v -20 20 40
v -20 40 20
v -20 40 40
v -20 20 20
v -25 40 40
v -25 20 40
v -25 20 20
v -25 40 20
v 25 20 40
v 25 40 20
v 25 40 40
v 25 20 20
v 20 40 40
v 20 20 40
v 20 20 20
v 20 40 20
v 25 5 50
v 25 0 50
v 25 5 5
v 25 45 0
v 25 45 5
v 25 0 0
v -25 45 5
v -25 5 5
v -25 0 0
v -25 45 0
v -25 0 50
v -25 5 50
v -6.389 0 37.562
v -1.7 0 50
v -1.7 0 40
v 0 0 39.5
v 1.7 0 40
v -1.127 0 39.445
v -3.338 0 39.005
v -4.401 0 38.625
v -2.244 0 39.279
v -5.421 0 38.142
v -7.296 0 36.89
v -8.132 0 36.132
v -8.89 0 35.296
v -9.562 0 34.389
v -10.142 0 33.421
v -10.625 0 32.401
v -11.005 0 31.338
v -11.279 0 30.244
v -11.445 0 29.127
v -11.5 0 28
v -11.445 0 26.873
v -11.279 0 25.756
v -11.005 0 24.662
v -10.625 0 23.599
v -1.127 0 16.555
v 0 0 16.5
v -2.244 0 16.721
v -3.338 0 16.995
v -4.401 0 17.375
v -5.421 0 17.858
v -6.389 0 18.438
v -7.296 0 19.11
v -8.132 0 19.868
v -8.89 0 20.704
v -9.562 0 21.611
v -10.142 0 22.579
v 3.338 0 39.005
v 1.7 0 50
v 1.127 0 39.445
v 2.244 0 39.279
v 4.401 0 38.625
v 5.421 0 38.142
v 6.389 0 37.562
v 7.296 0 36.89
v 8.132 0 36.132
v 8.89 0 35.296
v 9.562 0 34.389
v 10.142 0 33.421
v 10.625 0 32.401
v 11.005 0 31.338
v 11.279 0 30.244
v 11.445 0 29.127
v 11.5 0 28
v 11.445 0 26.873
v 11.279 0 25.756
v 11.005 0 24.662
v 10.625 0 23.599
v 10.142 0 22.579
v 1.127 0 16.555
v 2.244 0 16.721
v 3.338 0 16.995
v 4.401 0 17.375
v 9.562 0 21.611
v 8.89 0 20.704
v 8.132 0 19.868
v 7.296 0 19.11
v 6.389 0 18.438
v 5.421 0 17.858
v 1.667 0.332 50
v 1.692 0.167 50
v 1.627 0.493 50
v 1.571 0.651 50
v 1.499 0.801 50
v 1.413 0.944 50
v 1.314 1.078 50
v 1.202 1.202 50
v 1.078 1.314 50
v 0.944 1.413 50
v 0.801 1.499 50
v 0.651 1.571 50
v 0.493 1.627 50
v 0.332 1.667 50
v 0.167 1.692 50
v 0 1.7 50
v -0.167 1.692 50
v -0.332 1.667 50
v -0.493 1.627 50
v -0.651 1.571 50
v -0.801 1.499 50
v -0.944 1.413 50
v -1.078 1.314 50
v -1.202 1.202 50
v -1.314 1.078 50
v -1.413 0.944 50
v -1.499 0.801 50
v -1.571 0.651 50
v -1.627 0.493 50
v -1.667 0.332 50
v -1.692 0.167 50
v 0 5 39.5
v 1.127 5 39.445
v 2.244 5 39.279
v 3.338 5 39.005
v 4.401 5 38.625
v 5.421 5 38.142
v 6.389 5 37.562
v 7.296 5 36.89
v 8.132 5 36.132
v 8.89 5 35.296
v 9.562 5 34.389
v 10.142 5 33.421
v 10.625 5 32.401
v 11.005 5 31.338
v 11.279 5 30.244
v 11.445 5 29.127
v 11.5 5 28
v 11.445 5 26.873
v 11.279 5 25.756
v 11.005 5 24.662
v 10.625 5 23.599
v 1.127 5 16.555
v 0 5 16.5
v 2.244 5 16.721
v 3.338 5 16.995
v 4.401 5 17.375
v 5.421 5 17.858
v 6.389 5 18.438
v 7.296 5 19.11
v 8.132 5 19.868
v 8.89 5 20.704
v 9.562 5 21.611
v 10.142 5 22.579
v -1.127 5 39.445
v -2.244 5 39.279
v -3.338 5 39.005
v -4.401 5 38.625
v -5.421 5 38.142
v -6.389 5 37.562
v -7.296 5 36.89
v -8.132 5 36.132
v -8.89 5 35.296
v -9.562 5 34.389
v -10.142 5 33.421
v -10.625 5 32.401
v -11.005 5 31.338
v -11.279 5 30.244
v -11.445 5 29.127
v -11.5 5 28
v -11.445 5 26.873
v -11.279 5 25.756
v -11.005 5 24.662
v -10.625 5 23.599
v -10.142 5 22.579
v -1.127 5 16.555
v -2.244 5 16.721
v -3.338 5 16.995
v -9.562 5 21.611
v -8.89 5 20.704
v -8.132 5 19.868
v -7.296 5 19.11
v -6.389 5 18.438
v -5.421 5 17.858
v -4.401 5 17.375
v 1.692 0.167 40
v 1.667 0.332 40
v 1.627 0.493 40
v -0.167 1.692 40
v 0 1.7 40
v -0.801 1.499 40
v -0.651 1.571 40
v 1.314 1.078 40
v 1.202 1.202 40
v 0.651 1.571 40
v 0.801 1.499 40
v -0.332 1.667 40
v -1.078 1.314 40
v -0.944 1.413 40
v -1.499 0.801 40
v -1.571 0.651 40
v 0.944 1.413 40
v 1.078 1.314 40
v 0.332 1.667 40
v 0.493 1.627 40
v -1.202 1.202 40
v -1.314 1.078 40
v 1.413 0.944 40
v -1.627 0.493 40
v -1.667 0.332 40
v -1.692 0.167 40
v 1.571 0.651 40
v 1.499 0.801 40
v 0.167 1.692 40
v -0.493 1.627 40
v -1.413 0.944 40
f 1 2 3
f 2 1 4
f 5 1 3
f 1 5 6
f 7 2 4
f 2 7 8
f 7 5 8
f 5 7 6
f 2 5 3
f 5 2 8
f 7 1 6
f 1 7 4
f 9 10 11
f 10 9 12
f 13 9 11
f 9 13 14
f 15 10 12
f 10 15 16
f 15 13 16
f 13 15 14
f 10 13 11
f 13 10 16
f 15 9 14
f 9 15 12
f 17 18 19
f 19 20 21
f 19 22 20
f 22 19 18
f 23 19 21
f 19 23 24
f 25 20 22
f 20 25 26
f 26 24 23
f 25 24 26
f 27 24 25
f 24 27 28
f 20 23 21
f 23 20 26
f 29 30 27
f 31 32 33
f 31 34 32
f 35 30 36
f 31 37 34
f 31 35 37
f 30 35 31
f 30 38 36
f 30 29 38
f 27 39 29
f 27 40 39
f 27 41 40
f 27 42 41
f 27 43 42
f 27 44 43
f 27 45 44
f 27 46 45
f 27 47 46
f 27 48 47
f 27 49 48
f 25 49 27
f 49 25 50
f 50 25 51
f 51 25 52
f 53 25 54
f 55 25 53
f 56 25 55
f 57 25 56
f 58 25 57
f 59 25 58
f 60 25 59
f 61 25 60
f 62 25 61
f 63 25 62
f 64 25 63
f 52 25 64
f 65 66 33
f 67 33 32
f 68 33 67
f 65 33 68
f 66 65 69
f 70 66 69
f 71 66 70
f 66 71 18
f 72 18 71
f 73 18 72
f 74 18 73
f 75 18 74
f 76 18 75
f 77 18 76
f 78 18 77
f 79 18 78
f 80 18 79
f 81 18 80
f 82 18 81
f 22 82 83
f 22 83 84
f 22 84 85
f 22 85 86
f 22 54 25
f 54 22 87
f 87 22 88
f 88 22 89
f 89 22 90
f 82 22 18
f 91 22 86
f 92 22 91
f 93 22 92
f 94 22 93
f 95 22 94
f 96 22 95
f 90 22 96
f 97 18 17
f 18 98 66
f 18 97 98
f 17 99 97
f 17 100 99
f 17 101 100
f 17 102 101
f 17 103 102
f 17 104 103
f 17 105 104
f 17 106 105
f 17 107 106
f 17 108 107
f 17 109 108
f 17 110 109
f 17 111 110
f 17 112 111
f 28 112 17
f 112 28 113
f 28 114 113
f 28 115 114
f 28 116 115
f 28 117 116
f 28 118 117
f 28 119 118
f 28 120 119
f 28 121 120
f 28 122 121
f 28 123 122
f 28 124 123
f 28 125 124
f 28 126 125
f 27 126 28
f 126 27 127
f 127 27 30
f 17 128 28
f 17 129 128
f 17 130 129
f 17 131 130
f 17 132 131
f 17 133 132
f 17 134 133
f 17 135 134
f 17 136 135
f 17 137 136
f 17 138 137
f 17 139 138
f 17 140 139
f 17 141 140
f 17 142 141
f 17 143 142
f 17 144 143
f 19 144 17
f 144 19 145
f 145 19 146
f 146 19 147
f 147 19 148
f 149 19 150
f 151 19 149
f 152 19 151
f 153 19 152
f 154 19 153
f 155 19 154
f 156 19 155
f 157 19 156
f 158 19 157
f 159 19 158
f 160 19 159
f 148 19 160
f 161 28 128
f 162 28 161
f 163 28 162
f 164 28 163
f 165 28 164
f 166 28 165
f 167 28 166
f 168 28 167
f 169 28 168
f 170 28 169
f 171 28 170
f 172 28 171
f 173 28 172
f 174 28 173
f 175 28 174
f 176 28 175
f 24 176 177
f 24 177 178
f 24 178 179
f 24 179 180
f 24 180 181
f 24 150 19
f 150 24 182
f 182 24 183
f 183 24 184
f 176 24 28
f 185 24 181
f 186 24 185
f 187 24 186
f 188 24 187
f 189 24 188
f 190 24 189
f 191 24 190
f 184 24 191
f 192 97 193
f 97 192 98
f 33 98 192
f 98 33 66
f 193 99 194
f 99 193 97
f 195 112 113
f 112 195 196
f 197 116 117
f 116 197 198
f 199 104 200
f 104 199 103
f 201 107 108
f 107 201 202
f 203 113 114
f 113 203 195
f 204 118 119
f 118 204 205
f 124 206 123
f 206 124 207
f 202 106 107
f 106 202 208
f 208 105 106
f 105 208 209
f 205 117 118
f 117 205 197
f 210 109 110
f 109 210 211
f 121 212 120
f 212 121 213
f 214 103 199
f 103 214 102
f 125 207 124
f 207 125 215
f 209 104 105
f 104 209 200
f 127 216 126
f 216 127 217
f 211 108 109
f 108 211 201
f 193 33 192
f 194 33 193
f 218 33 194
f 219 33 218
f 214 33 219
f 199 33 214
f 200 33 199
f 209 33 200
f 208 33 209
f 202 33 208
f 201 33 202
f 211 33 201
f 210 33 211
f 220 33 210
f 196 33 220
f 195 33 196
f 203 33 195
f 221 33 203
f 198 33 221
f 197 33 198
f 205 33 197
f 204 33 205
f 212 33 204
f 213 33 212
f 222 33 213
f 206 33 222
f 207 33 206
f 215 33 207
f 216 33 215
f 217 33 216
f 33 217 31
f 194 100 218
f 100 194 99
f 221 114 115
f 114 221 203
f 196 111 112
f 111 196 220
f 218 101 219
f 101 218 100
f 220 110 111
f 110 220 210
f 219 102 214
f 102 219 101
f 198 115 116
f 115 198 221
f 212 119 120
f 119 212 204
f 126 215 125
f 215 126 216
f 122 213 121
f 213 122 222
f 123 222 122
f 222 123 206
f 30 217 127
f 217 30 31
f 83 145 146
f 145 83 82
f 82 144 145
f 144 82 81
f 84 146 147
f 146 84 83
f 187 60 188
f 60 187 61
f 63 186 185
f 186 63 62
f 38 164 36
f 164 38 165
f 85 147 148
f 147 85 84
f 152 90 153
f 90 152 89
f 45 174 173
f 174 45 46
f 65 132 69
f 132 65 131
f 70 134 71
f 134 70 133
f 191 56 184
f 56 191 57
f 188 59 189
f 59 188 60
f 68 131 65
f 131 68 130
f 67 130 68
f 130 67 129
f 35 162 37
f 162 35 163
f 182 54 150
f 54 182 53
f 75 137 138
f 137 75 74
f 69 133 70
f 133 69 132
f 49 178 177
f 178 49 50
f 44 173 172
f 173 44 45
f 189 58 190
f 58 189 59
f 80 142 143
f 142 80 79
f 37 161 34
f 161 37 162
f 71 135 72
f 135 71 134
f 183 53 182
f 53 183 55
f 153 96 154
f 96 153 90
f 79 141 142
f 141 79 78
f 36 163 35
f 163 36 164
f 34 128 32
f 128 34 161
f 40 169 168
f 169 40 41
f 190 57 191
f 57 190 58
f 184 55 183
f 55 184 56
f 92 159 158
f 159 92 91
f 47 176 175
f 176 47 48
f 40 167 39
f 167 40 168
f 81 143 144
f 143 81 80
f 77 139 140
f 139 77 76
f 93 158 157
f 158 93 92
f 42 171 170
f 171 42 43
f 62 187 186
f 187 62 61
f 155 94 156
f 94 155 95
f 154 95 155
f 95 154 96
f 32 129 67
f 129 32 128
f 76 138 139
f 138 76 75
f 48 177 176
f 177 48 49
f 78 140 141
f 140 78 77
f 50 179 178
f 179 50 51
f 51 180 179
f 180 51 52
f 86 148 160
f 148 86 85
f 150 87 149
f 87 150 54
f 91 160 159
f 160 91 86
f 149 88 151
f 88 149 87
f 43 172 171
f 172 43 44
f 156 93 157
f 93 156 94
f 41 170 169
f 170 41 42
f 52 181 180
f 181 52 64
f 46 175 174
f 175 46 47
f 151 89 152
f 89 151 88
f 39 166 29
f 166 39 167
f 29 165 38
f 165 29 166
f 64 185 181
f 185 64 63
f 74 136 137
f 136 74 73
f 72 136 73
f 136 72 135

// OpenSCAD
// L-shaped mounting bracket for NEMA 17 stepper motor (e.g. syringe pump)
// Print orientation: base plate on bed, motor plate builds upward (+Z)

$fn = 64;

// ---- Base plate ----
base_x = 25;              // plate spans x = -25 .. 25
base_y = 45;              // plate spans y = 0 .. 45
base_t = 5;               // plate thickness (z = 0 .. 5)

// ---- Motor plate ----
motor_x = 25;             // plate spans x = -25 .. 25
motor_y = 5;              // plate spans y = 0 .. 5
motor_h = 50;             // plate height (z = 0 .. 50)

// ---- Boss hole (motor centring boss) ----
boss_d = 23;              // hole diameter
boss_x = 0;               // hole centre x
boss_z = 28;              // hole centre z

// ---- Screw holes (M3, on square pattern) ----
screw_d = 3.4;            // hole diameter
screw_n = 4;              // number of holes
screw_a = 31;             // square pattern size (centre to centre)
screw_h = 10;             // depth from top face of motor plate

// ---- Gussets ----
gus_t = 5;                // gusset thickness (along X)
gus_y = 20;               // triangle leg along +Y
gus_z = 20;               // triangle leg along +Z

// ---- Misc ----
eps = 0.5;                // cutter overshoot past faces

difference() {
    union() {
        // Base plate
        translate([-base_x, 0, 0])
            cube([2 * base_x, base_y, base_t]);

        // Motor plate, standing on the back edge of the base
        translate([-motor_x, 0, 0])
            cube([2 * motor_x, motor_y, motor_h]);

        // Gussets, flush with left and right edges
        for (sx = [-1, 1])
            translate([sx > 0 ? motor_x - gus_t : -motor_x, gus_y, gus_z])
                cube([gus_t, gus_y, gus_z]);
    }

    // Boss hole through motor plate (along Y)
    translate([boss_x, -eps, boss_z])
        rotate([-90, 0, 0])
            cylinder(d = boss_d, h = motor_y + 2 * eps);

    // M3 screw holes on square pattern, centred on boss hole
    for (i = [0 : screw_n - 1]) {
        x = (i % 2 - 1) * screw_a / 2;
        y = (i / 2 - 0.5) * screw_a;
        translate([x, y, motor_h - screw_h])
            cylinder(d = screw_d, h = screw_h + eps);
    }
}
